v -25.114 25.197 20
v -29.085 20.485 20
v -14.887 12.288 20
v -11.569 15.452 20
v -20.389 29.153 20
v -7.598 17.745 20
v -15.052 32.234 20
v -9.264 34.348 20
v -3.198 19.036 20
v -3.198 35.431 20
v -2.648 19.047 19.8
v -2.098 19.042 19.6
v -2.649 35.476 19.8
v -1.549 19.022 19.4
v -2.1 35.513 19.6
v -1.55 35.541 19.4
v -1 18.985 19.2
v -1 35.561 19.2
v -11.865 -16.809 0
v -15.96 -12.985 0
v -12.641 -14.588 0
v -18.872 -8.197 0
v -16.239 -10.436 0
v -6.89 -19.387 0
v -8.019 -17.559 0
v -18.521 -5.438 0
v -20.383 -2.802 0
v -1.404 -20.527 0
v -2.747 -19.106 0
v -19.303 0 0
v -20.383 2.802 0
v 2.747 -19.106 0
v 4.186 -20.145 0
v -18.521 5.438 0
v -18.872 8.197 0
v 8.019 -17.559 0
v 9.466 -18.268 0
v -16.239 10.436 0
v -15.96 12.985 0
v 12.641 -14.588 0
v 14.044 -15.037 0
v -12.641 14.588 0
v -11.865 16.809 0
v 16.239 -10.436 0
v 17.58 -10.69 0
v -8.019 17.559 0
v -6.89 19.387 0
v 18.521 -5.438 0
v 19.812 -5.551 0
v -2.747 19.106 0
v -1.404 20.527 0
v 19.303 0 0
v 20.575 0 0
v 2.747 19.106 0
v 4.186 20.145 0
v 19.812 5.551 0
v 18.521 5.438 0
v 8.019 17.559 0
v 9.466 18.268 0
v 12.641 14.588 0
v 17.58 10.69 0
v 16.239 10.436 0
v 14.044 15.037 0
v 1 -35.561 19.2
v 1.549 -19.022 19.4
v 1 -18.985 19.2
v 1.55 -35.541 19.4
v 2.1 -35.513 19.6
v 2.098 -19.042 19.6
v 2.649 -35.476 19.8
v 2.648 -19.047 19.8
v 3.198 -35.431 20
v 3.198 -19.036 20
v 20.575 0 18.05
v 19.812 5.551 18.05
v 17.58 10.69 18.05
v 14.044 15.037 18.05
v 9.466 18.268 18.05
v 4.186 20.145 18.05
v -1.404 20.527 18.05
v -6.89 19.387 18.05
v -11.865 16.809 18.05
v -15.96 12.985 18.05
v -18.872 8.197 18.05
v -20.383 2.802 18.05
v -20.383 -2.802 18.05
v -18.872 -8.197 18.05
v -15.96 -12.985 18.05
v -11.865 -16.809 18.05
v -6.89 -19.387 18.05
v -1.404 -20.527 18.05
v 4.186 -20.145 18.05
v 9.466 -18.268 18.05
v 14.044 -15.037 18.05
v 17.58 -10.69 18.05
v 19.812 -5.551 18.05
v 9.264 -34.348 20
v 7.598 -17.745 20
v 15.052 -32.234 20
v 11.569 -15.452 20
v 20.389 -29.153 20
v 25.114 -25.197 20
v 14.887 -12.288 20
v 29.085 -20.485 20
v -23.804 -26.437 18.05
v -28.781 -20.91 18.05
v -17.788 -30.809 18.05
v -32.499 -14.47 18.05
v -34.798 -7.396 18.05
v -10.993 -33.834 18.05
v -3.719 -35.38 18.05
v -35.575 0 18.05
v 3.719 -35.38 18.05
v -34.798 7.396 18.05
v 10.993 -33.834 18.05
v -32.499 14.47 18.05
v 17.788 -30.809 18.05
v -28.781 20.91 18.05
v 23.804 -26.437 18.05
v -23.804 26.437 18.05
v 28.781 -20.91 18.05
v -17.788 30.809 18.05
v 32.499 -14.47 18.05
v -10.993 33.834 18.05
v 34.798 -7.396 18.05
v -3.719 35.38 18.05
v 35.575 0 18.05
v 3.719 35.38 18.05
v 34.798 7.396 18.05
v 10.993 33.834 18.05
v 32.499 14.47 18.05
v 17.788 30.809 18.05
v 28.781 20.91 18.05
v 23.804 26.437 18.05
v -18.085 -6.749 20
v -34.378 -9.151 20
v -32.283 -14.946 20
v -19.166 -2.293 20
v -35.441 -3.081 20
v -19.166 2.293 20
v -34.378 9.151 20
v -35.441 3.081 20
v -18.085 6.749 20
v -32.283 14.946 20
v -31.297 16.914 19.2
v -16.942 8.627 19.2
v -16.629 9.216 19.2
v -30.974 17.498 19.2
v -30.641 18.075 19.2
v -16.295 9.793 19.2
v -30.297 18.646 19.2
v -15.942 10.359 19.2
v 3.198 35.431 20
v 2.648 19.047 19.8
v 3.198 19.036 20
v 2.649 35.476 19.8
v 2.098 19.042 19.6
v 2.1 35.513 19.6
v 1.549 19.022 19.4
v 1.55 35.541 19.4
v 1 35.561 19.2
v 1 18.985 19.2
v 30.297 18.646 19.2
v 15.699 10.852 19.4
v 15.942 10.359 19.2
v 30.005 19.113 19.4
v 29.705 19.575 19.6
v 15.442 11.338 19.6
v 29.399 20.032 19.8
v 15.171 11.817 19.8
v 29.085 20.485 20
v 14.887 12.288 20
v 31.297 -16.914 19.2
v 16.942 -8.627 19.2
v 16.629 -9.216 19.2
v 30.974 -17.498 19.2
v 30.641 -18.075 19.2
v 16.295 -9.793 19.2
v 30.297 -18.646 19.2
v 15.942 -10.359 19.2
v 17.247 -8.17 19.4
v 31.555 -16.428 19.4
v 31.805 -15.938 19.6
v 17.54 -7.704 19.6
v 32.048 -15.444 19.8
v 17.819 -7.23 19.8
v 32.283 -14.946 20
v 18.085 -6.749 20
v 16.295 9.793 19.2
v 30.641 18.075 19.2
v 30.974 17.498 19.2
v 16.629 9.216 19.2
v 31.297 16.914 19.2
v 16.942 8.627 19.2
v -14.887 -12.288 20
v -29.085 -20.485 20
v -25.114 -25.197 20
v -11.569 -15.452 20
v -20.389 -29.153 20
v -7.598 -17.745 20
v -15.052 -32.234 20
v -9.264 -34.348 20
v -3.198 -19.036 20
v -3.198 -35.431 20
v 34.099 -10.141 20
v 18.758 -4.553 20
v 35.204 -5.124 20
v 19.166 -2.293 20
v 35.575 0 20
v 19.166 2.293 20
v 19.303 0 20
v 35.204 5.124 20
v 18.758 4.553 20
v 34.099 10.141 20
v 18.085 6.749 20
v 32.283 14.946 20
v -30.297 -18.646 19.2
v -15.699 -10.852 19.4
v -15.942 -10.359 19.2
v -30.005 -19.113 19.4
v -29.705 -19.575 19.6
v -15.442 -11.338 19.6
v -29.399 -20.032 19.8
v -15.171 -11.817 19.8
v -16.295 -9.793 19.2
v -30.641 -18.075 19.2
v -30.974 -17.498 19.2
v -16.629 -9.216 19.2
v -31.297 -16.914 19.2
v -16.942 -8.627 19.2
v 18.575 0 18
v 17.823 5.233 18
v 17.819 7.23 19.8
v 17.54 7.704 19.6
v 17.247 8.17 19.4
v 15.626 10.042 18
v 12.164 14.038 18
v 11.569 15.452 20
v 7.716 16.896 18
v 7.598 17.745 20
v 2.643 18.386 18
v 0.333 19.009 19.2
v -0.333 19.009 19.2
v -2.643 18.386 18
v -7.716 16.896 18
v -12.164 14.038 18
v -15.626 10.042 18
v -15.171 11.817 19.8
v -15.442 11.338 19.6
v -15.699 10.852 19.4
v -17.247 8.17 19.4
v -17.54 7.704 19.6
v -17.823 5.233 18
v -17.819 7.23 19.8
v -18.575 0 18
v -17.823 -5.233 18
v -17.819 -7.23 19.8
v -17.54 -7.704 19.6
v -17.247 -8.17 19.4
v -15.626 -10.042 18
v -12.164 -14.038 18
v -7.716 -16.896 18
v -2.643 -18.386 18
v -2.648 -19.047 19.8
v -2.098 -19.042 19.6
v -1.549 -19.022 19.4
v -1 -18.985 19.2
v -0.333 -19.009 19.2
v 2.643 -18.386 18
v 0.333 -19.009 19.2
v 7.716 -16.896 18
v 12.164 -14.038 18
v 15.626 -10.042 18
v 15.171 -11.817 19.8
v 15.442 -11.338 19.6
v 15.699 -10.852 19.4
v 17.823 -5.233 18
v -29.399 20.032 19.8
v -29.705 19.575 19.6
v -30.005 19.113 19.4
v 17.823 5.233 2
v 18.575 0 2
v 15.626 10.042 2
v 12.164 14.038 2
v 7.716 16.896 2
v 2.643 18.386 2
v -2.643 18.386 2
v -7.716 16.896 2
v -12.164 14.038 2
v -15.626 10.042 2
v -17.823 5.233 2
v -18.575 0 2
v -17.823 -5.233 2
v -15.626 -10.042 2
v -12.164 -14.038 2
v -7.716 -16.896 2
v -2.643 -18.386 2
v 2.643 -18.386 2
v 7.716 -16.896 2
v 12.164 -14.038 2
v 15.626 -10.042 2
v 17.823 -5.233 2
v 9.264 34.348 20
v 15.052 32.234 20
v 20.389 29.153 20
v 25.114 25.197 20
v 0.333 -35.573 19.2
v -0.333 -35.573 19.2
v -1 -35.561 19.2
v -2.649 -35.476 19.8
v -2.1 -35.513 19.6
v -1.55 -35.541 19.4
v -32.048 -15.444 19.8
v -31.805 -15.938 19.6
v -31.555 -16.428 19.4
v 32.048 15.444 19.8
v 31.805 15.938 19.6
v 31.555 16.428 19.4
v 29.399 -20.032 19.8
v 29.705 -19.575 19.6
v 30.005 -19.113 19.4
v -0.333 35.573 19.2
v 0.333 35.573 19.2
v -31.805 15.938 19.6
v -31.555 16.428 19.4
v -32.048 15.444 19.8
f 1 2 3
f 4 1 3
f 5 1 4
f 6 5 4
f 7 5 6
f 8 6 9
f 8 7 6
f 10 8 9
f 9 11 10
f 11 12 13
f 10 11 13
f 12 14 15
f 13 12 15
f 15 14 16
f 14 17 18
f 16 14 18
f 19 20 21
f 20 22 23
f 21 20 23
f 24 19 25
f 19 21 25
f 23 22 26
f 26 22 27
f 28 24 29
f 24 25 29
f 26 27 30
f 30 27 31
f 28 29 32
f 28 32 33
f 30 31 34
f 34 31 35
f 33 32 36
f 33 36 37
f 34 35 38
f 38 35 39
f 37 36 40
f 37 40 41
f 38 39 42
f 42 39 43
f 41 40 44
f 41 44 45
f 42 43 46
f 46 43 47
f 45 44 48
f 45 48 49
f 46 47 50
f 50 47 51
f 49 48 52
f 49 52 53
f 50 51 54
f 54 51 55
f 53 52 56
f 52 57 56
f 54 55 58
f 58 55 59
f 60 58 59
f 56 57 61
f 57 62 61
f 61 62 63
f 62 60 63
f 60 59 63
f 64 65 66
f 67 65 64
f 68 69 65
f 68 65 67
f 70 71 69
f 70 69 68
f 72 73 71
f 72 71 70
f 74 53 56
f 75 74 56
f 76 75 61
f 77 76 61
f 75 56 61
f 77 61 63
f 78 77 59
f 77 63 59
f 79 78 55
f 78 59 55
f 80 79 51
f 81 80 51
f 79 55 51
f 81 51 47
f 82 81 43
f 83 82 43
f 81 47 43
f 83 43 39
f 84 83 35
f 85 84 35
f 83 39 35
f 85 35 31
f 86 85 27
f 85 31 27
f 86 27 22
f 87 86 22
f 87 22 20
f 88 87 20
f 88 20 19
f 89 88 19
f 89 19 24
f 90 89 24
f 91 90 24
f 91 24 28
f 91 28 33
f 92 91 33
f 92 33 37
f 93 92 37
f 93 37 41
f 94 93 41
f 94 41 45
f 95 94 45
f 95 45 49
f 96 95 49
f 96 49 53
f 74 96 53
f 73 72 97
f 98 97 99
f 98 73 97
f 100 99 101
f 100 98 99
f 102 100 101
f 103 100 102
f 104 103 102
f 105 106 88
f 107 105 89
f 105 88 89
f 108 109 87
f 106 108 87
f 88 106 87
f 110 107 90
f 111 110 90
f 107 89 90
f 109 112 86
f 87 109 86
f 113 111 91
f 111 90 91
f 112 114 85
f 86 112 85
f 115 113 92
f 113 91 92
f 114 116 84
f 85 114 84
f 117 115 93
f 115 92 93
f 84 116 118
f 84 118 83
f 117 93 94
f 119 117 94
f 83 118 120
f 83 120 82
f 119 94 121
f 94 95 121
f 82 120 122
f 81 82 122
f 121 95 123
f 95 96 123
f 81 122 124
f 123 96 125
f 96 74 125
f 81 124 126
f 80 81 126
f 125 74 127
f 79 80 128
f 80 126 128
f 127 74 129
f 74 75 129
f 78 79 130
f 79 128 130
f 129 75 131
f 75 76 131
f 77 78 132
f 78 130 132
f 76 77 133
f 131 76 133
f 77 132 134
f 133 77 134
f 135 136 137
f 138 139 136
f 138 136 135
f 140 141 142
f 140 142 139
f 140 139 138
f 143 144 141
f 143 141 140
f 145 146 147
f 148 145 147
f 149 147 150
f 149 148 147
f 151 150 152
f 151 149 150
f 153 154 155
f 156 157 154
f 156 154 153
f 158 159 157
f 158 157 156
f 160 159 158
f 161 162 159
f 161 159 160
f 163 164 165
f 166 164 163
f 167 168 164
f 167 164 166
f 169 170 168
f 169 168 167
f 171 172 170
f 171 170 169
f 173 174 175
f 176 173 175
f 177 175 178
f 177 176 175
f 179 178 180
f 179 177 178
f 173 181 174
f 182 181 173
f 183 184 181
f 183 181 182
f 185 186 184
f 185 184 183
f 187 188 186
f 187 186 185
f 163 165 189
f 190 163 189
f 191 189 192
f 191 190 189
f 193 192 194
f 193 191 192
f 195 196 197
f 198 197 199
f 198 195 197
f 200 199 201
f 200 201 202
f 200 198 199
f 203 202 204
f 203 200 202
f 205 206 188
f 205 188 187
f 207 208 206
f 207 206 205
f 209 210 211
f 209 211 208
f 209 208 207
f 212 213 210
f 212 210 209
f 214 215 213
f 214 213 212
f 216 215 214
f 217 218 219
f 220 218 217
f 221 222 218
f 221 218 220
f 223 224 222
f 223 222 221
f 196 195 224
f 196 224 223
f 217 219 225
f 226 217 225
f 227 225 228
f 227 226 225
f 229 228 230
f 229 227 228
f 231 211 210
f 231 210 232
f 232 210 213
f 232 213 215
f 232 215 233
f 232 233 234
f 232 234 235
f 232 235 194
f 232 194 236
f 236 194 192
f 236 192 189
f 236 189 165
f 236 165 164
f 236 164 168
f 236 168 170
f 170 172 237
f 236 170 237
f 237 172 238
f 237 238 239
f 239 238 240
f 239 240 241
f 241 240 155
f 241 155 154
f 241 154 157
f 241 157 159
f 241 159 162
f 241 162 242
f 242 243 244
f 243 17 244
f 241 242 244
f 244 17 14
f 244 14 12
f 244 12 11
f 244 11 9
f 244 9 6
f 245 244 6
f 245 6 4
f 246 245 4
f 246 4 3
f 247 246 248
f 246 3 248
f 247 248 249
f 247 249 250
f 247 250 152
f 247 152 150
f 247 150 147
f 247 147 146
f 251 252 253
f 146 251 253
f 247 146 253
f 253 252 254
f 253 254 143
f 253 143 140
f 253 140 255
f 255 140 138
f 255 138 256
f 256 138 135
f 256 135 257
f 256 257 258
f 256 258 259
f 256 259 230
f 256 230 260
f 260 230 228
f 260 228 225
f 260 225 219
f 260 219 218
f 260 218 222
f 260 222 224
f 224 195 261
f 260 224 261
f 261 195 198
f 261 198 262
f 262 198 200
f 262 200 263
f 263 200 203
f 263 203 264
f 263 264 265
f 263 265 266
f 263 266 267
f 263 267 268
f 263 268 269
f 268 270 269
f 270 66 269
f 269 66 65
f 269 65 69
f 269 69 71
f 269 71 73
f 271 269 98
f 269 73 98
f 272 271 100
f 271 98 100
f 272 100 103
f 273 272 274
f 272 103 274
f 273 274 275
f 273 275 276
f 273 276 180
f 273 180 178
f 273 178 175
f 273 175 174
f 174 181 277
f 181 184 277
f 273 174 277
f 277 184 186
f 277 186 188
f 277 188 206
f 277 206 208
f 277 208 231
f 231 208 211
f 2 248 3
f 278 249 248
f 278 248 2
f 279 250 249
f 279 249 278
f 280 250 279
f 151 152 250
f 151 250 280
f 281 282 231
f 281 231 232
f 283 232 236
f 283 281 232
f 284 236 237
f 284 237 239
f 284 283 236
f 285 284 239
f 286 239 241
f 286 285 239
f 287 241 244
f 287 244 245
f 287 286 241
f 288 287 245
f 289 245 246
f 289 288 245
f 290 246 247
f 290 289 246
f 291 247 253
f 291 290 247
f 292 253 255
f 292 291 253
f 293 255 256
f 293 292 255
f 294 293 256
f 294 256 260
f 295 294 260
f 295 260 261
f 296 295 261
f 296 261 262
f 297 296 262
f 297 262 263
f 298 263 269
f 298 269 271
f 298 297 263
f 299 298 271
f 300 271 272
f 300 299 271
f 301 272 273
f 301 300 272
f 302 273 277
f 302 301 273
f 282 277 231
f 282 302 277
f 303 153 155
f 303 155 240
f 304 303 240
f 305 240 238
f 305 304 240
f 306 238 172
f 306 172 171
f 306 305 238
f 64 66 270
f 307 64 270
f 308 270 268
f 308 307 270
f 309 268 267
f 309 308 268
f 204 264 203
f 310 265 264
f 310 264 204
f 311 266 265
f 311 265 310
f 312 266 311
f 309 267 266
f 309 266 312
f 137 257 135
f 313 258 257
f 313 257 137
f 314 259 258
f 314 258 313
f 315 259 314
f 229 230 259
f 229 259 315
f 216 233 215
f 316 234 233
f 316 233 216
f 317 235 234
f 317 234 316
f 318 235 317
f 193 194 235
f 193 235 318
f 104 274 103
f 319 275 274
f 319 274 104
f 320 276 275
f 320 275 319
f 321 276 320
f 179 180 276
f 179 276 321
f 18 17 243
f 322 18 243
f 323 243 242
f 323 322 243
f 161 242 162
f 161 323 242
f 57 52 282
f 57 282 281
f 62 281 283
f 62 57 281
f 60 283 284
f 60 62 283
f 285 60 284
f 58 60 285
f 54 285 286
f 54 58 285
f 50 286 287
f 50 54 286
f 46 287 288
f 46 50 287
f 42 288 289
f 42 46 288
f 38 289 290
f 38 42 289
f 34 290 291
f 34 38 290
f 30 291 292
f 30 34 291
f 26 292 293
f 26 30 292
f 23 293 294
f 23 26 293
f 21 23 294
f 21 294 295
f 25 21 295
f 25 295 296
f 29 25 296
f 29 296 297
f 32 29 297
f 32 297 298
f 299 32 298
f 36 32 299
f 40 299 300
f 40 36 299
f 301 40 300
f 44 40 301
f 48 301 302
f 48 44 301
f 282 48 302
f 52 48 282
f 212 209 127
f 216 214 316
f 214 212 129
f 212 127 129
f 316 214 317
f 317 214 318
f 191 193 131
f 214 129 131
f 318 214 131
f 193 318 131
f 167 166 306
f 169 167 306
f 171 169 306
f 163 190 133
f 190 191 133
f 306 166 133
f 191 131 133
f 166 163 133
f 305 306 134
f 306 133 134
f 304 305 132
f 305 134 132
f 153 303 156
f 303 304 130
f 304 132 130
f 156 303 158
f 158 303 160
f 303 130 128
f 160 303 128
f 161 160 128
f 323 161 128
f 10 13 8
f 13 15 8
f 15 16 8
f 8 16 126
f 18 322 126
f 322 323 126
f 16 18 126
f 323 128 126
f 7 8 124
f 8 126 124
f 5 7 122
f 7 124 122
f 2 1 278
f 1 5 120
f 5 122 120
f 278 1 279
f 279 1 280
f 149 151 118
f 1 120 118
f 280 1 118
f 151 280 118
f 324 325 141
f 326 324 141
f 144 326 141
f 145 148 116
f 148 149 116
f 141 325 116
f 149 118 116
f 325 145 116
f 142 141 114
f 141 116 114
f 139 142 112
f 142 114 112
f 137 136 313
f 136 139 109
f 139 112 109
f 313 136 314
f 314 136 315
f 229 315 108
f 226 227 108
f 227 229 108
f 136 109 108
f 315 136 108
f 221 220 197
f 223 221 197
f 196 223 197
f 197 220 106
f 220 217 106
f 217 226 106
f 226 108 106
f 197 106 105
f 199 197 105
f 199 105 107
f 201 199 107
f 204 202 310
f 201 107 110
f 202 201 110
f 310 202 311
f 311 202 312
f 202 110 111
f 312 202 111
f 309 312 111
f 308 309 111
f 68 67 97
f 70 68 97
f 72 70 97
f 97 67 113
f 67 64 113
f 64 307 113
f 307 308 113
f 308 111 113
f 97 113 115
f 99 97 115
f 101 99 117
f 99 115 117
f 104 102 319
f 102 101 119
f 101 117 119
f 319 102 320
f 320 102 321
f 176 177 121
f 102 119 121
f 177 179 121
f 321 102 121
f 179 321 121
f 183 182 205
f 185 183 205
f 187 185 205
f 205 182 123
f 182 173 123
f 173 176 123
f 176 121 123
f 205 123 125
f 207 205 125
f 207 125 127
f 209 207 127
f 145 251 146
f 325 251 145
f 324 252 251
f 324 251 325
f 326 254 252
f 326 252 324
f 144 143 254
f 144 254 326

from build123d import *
from OCP.BRepFilletAPI import BRepFilletAPI_MakeChamfer

# Parameters (mm, degrees)
SKETCH1_R                      = 20.575
SKETCH1_R_2                    = 18.575
BOSS_EXTRUDE1_DEPTH            = 20
BOSS_EXTRUDE2_START            = -1.95
SKETCH2_R                      = 35.575
SKETCH2_R_2                    = 20.575
BOSS_EXTRUDE2_DEPTH            = 1.95
CHAMFER2_SIZE                  = 2
CHAMFER2_SIZE2                 = 0.727940469
SKETCH3_W                      = 2
SKETCH3_H                      = 18
CUT_EXTRUDE1_DEPTH             = 0.8
CHAMFER3_SIZE                  = 2.197981936
CHAMFER3_SIZE_2                = 0.8
CIRPATTERN2_COUNT              = 6
CHAMFER3_OF_CIRPATTERN2_SIZE   = 2.197981936
CHAMFER3_OF_CIRPATTERN2_SIZE_2 = 0.8


with BuildPart() as part:
    # Sketch1 → Boss-Extrude1 (new body)
    with BuildSketch(Plane.XY):
        Circle(SKETCH1_R)
        Circle(SKETCH1_R_2, mode=Mode.SUBTRACT)
    extrude(amount=BOSS_EXTRUDE1_DEPTH)

    # Sketch2 → Boss-Extrude2 (add)
    with BuildSketch(Plane.XY.offset(20).offset(BOSS_EXTRUDE2_START)):
        Circle(SKETCH2_R)
        Circle(SKETCH2_R_2, mode=Mode.SUBTRACT)
    extrude(amount=BOSS_EXTRUDE2_DEPTH)

    # Chamfer2
    chamfer2_edges = [part.edges().sort_by_distance(p)[0] for p in [
        (-18.575, 0, 0),
        (-18.575, 0, 20),
    ]]
    chamfer2_side = [part.faces().sort_by_distance(p)[0] for p in [
        (-18.575, 0, 10),
    ]]
    chamfer(chamfer2_edges, length=CHAMFER2_SIZE, length2=CHAMFER2_SIZE2, reference=chamfer2_side[0])

    # Sketch3 → Cut-Extrude1 (cut)
    with BuildSketch(Plane.XY.offset(20)):
        with Locations((0, 27.575)):
            Rectangle(SKETCH3_W, SKETCH3_H)
    cut_extrude1 = extrude(amount=-CUT_EXTRUDE1_DEPTH, mode=Mode.SUBTRACT)

    # Chamfer3
    chamfer3_edges_1 = [part.edges().sort_by_distance(p)[0] for p in [
        (1, 27.418981343, 20),
    ]]
    chamfer3_side_1 = [part.faces().sort_by_distance(p)[0] for p in [
        (1.016, 27.418981343, 20),
    ]]
    chamfer3_edges_2 = [part.edges().sort_by_distance(p)[0] for p in [
        (-1, 27.418981343, 20),
    ]]
    chamfer3_side_2 = [part.faces().sort_by_distance(p)[0] for p in [
        (-1.016, 27.418981343, 20),
    ]]
    chamfer3 = BRepFilletAPI_MakeChamfer(part.part.solid().wrapped)
    for e in chamfer3_edges_1:
        chamfer3.Add(CHAMFER3_SIZE - 0.0001, CHAMFER3_SIZE_2 - 0.0001, e.wrapped, chamfer3_side_1[0].wrapped)
    for e in chamfer3_edges_2:
        chamfer3.Add(CHAMFER3_SIZE - 0.0001, CHAMFER3_SIZE_2 - 0.0001, e.wrapped, chamfer3_side_2[0].wrapped)
    add(Compound.cast(chamfer3.Shape()), mode=Mode.REPLACE)  # a hair under: the kernel refuses the full size

    # CirPattern2: Cut-Extrude1 ×6 about axis
    cirpattern2_axis = Axis((0, 0, 0), (0, 0, 1))
    for i in range(1, CIRPATTERN2_COUNT):
        add(cut_extrude1.rotate(cirpattern2_axis, i * 360 / CIRPATTERN2_COUNT), mode=Mode.SUBTRACT)

    # Chamfer3 of CirPattern2
    chamfer3_of_cirpattern2_edges_1 = [part.edges().sort_by_distance(p)[0] for p in [
        (-23.245534389, 14.575516075, 20),
    ]]
    chamfer3_of_cirpattern2_side_1 = [part.faces().sort_by_distance(p)[0] for p in [
        (-23.237534389, 14.589372482, 20),
    ]]
    chamfer3_of_cirpattern2_edges_2 = [part.edges().sort_by_distance(p)[0] for p in [
        (-24.245534389, 12.843465267, 20),
    ]]
    chamfer3_of_cirpattern2_side_2 = [part.faces().sort_by_distance(p)[0] for p in [
        (-24.245534389, 12.843465267, 19.984),
    ]]
    chamfer3_of_cirpattern2_edges_3 = [part.edges().sort_by_distance(p)[0] for p in [
        (-24.245534389, -12.843465267, 20),
    ]]
    chamfer3_of_cirpattern2_side_3 = [part.faces().sort_by_distance(p)[0] for p in [
        (-24.253534389, -12.829608861, 20),
    ]]
    chamfer3_of_cirpattern2_edges_4 = [part.edges().sort_by_distance(p)[0] for p in [
        (-23.245534389, -14.575516075, 20),
    ]]
    chamfer3_of_cirpattern2_side_4 = [part.faces().sort_by_distance(p)[0] for p in [
        (-23.245534389, -14.575516075, 19.984),
    ]]
    chamfer3_of_cirpattern2_edges_5 = [part.edges().sort_by_distance(p)[0] for p in [
        (-1, -27.418981343, 20),
    ]]
    chamfer3_of_cirpattern2_side_5 = [part.faces().sort_by_distance(p)[0] for p in [
        (-1.016, -27.418981343, 20),
    ]]
    chamfer3_of_cirpattern2_edges_6 = [part.edges().sort_by_distance(p)[0] for p in [
        (1, -27.418981343, 20),
    ]]
    chamfer3_of_cirpattern2_side_6 = [part.faces().sort_by_distance(p)[0] for p in [
        (1, -27.418981343, 19.984),
    ]]
    chamfer3_of_cirpattern2_edges_7 = [part.edges().sort_by_distance(p)[0] for p in [
        (23.245534389, -14.575516075, 20),
    ]]
    chamfer3_of_cirpattern2_side_7 = [part.faces().sort_by_distance(p)[0] for p in [
        (23.237534389, -14.589372482, 20),
    ]]
    chamfer3_of_cirpattern2_edges_8 = [part.edges().sort_by_distance(p)[0] for p in [
        (24.245534389, -12.843465267, 20),
    ]]
    chamfer3_of_cirpattern2_side_8 = [part.faces().sort_by_distance(p)[0] for p in [
        (24.245534389, -12.843465267, 19.984),
    ]]
    chamfer3_of_cirpattern2_edges_9 = [part.edges().sort_by_distance(p)[0] for p in [
        (24.245534389, 12.843465267, 20),
    ]]
    chamfer3_of_cirpattern2_side_9 = [part.faces().sort_by_distance(p)[0] for p in [
        (24.253534389, 12.829608861, 20),
    ]]
    chamfer3_of_cirpattern2_edges_10 = [part.edges().sort_by_distance(p)[0] for p in [
        (23.245534389, 14.575516075, 20),
    ]]
    chamfer3_of_cirpattern2_side_10 = [part.faces().sort_by_distance(p)[0] for p in [
        (23.245534389, 14.575516075, 19.984),
    ]]
    chamfer3_of_cirpattern2 = BRepFilletAPI_MakeChamfer(part.part.solid().wrapped)
    for e in chamfer3_of_cirpattern2_edges_1:
        chamfer3_of_cirpattern2.Add(CHAMFER3_OF_CIRPATTERN2_SIZE - 0.0001, CHAMFER3_OF_CIRPATTERN2_SIZE_2 - 0.0001, e.wrapped, chamfer3_of_cirpattern2_side_1[0].wrapped)
    for e in chamfer3_of_cirpattern2_edges_2:
        chamfer3_of_cirpattern2.Add(CHAMFER3_OF_CIRPATTERN2_SIZE_2 - 0.0001, CHAMFER3_OF_CIRPATTERN2_SIZE - 0.0001, e.wrapped, chamfer3_of_cirpattern2_side_2[0].wrapped)
    for e in chamfer3_of_cirpattern2_edges_3:
        chamfer3_of_cirpattern2.Add(CHAMFER3_OF_CIRPATTERN2_SIZE - 0.0001, CHAMFER3_OF_CIRPATTERN2_SIZE_2 - 0.0001, e.wrapped, chamfer3_of_cirpattern2_side_3[0].wrapped)
    for e in chamfer3_of_cirpattern2_edges_4:
        chamfer3_of_cirpattern2.Add(CHAMFER3_OF_CIRPATTERN2_SIZE_2 - 0.0001, CHAMFER3_OF_CIRPATTERN2_SIZE - 0.0001, e.wrapped, chamfer3_of_cirpattern2_side_4[0].wrapped)
    for e in chamfer3_of_cirpattern2_edges_5:
        chamfer3_of_cirpattern2.Add(CHAMFER3_OF_CIRPATTERN2_SIZE - 0.0001, CHAMFER3_OF_CIRPATTERN2_SIZE_2 - 0.0001, e.wrapped, chamfer3_of_cirpattern2_side_5[0].wrapped)
    for e in chamfer3_of_cirpattern2_edges_6:
        chamfer3_of_cirpattern2.Add(CHAMFER3_OF_CIRPATTERN2_SIZE_2 - 0.0001, CHAMFER3_OF_CIRPATTERN2_SIZE - 0.0001, e.wrapped, chamfer3_of_cirpattern2_side_6[0].wrapped)
    for e in chamfer3_of_cirpattern2_edges_7:
        chamfer3_of_cirpattern2.Add(CHAMFER3_OF_CIRPATTERN2_SIZE - 0.0001, CHAMFER3_OF_CIRPATTERN2_SIZE_2 - 0.0001, e.wrapped, chamfer3_of_cirpattern2_side_7[0].wrapped)
    for e in chamfer3_of_cirpattern2_edges_8:
        chamfer3_of_cirpattern2.Add(CHAMFER3_OF_CIRPATTERN2_SIZE_2 - 0.0001, CHAMFER3_OF_CIRPATTERN2_SIZE - 0.0001, e.wrapped, chamfer3_of_cirpattern2_side_8[0].wrapped)
    for e in chamfer3_of_cirpattern2_edges_9:
        chamfer3_of_cirpattern2.Add(CHAMFER3_OF_CIRPATTERN2_SIZE - 0.0001, CHAMFER3_OF_CIRPATTERN2_SIZE_2 - 0.0001, e.wrapped, chamfer3_of_cirpattern2_side_9[0].wrapped)
    for e in chamfer3_of_cirpattern2_edges_10:
        chamfer3_of_cirpattern2.Add(CHAMFER3_OF_CIRPATTERN2_SIZE_2 - 0.0001, CHAMFER3_OF_CIRPATTERN2_SIZE - 0.0001, e.wrapped, chamfer3_of_cirpattern2_side_10[0].wrapped)
    add(Compound.cast(chamfer3_of_cirpattern2.Shape()), mode=Mode.REPLACE)  # a hair under: the kernel refuses the full size


solid = part.part
